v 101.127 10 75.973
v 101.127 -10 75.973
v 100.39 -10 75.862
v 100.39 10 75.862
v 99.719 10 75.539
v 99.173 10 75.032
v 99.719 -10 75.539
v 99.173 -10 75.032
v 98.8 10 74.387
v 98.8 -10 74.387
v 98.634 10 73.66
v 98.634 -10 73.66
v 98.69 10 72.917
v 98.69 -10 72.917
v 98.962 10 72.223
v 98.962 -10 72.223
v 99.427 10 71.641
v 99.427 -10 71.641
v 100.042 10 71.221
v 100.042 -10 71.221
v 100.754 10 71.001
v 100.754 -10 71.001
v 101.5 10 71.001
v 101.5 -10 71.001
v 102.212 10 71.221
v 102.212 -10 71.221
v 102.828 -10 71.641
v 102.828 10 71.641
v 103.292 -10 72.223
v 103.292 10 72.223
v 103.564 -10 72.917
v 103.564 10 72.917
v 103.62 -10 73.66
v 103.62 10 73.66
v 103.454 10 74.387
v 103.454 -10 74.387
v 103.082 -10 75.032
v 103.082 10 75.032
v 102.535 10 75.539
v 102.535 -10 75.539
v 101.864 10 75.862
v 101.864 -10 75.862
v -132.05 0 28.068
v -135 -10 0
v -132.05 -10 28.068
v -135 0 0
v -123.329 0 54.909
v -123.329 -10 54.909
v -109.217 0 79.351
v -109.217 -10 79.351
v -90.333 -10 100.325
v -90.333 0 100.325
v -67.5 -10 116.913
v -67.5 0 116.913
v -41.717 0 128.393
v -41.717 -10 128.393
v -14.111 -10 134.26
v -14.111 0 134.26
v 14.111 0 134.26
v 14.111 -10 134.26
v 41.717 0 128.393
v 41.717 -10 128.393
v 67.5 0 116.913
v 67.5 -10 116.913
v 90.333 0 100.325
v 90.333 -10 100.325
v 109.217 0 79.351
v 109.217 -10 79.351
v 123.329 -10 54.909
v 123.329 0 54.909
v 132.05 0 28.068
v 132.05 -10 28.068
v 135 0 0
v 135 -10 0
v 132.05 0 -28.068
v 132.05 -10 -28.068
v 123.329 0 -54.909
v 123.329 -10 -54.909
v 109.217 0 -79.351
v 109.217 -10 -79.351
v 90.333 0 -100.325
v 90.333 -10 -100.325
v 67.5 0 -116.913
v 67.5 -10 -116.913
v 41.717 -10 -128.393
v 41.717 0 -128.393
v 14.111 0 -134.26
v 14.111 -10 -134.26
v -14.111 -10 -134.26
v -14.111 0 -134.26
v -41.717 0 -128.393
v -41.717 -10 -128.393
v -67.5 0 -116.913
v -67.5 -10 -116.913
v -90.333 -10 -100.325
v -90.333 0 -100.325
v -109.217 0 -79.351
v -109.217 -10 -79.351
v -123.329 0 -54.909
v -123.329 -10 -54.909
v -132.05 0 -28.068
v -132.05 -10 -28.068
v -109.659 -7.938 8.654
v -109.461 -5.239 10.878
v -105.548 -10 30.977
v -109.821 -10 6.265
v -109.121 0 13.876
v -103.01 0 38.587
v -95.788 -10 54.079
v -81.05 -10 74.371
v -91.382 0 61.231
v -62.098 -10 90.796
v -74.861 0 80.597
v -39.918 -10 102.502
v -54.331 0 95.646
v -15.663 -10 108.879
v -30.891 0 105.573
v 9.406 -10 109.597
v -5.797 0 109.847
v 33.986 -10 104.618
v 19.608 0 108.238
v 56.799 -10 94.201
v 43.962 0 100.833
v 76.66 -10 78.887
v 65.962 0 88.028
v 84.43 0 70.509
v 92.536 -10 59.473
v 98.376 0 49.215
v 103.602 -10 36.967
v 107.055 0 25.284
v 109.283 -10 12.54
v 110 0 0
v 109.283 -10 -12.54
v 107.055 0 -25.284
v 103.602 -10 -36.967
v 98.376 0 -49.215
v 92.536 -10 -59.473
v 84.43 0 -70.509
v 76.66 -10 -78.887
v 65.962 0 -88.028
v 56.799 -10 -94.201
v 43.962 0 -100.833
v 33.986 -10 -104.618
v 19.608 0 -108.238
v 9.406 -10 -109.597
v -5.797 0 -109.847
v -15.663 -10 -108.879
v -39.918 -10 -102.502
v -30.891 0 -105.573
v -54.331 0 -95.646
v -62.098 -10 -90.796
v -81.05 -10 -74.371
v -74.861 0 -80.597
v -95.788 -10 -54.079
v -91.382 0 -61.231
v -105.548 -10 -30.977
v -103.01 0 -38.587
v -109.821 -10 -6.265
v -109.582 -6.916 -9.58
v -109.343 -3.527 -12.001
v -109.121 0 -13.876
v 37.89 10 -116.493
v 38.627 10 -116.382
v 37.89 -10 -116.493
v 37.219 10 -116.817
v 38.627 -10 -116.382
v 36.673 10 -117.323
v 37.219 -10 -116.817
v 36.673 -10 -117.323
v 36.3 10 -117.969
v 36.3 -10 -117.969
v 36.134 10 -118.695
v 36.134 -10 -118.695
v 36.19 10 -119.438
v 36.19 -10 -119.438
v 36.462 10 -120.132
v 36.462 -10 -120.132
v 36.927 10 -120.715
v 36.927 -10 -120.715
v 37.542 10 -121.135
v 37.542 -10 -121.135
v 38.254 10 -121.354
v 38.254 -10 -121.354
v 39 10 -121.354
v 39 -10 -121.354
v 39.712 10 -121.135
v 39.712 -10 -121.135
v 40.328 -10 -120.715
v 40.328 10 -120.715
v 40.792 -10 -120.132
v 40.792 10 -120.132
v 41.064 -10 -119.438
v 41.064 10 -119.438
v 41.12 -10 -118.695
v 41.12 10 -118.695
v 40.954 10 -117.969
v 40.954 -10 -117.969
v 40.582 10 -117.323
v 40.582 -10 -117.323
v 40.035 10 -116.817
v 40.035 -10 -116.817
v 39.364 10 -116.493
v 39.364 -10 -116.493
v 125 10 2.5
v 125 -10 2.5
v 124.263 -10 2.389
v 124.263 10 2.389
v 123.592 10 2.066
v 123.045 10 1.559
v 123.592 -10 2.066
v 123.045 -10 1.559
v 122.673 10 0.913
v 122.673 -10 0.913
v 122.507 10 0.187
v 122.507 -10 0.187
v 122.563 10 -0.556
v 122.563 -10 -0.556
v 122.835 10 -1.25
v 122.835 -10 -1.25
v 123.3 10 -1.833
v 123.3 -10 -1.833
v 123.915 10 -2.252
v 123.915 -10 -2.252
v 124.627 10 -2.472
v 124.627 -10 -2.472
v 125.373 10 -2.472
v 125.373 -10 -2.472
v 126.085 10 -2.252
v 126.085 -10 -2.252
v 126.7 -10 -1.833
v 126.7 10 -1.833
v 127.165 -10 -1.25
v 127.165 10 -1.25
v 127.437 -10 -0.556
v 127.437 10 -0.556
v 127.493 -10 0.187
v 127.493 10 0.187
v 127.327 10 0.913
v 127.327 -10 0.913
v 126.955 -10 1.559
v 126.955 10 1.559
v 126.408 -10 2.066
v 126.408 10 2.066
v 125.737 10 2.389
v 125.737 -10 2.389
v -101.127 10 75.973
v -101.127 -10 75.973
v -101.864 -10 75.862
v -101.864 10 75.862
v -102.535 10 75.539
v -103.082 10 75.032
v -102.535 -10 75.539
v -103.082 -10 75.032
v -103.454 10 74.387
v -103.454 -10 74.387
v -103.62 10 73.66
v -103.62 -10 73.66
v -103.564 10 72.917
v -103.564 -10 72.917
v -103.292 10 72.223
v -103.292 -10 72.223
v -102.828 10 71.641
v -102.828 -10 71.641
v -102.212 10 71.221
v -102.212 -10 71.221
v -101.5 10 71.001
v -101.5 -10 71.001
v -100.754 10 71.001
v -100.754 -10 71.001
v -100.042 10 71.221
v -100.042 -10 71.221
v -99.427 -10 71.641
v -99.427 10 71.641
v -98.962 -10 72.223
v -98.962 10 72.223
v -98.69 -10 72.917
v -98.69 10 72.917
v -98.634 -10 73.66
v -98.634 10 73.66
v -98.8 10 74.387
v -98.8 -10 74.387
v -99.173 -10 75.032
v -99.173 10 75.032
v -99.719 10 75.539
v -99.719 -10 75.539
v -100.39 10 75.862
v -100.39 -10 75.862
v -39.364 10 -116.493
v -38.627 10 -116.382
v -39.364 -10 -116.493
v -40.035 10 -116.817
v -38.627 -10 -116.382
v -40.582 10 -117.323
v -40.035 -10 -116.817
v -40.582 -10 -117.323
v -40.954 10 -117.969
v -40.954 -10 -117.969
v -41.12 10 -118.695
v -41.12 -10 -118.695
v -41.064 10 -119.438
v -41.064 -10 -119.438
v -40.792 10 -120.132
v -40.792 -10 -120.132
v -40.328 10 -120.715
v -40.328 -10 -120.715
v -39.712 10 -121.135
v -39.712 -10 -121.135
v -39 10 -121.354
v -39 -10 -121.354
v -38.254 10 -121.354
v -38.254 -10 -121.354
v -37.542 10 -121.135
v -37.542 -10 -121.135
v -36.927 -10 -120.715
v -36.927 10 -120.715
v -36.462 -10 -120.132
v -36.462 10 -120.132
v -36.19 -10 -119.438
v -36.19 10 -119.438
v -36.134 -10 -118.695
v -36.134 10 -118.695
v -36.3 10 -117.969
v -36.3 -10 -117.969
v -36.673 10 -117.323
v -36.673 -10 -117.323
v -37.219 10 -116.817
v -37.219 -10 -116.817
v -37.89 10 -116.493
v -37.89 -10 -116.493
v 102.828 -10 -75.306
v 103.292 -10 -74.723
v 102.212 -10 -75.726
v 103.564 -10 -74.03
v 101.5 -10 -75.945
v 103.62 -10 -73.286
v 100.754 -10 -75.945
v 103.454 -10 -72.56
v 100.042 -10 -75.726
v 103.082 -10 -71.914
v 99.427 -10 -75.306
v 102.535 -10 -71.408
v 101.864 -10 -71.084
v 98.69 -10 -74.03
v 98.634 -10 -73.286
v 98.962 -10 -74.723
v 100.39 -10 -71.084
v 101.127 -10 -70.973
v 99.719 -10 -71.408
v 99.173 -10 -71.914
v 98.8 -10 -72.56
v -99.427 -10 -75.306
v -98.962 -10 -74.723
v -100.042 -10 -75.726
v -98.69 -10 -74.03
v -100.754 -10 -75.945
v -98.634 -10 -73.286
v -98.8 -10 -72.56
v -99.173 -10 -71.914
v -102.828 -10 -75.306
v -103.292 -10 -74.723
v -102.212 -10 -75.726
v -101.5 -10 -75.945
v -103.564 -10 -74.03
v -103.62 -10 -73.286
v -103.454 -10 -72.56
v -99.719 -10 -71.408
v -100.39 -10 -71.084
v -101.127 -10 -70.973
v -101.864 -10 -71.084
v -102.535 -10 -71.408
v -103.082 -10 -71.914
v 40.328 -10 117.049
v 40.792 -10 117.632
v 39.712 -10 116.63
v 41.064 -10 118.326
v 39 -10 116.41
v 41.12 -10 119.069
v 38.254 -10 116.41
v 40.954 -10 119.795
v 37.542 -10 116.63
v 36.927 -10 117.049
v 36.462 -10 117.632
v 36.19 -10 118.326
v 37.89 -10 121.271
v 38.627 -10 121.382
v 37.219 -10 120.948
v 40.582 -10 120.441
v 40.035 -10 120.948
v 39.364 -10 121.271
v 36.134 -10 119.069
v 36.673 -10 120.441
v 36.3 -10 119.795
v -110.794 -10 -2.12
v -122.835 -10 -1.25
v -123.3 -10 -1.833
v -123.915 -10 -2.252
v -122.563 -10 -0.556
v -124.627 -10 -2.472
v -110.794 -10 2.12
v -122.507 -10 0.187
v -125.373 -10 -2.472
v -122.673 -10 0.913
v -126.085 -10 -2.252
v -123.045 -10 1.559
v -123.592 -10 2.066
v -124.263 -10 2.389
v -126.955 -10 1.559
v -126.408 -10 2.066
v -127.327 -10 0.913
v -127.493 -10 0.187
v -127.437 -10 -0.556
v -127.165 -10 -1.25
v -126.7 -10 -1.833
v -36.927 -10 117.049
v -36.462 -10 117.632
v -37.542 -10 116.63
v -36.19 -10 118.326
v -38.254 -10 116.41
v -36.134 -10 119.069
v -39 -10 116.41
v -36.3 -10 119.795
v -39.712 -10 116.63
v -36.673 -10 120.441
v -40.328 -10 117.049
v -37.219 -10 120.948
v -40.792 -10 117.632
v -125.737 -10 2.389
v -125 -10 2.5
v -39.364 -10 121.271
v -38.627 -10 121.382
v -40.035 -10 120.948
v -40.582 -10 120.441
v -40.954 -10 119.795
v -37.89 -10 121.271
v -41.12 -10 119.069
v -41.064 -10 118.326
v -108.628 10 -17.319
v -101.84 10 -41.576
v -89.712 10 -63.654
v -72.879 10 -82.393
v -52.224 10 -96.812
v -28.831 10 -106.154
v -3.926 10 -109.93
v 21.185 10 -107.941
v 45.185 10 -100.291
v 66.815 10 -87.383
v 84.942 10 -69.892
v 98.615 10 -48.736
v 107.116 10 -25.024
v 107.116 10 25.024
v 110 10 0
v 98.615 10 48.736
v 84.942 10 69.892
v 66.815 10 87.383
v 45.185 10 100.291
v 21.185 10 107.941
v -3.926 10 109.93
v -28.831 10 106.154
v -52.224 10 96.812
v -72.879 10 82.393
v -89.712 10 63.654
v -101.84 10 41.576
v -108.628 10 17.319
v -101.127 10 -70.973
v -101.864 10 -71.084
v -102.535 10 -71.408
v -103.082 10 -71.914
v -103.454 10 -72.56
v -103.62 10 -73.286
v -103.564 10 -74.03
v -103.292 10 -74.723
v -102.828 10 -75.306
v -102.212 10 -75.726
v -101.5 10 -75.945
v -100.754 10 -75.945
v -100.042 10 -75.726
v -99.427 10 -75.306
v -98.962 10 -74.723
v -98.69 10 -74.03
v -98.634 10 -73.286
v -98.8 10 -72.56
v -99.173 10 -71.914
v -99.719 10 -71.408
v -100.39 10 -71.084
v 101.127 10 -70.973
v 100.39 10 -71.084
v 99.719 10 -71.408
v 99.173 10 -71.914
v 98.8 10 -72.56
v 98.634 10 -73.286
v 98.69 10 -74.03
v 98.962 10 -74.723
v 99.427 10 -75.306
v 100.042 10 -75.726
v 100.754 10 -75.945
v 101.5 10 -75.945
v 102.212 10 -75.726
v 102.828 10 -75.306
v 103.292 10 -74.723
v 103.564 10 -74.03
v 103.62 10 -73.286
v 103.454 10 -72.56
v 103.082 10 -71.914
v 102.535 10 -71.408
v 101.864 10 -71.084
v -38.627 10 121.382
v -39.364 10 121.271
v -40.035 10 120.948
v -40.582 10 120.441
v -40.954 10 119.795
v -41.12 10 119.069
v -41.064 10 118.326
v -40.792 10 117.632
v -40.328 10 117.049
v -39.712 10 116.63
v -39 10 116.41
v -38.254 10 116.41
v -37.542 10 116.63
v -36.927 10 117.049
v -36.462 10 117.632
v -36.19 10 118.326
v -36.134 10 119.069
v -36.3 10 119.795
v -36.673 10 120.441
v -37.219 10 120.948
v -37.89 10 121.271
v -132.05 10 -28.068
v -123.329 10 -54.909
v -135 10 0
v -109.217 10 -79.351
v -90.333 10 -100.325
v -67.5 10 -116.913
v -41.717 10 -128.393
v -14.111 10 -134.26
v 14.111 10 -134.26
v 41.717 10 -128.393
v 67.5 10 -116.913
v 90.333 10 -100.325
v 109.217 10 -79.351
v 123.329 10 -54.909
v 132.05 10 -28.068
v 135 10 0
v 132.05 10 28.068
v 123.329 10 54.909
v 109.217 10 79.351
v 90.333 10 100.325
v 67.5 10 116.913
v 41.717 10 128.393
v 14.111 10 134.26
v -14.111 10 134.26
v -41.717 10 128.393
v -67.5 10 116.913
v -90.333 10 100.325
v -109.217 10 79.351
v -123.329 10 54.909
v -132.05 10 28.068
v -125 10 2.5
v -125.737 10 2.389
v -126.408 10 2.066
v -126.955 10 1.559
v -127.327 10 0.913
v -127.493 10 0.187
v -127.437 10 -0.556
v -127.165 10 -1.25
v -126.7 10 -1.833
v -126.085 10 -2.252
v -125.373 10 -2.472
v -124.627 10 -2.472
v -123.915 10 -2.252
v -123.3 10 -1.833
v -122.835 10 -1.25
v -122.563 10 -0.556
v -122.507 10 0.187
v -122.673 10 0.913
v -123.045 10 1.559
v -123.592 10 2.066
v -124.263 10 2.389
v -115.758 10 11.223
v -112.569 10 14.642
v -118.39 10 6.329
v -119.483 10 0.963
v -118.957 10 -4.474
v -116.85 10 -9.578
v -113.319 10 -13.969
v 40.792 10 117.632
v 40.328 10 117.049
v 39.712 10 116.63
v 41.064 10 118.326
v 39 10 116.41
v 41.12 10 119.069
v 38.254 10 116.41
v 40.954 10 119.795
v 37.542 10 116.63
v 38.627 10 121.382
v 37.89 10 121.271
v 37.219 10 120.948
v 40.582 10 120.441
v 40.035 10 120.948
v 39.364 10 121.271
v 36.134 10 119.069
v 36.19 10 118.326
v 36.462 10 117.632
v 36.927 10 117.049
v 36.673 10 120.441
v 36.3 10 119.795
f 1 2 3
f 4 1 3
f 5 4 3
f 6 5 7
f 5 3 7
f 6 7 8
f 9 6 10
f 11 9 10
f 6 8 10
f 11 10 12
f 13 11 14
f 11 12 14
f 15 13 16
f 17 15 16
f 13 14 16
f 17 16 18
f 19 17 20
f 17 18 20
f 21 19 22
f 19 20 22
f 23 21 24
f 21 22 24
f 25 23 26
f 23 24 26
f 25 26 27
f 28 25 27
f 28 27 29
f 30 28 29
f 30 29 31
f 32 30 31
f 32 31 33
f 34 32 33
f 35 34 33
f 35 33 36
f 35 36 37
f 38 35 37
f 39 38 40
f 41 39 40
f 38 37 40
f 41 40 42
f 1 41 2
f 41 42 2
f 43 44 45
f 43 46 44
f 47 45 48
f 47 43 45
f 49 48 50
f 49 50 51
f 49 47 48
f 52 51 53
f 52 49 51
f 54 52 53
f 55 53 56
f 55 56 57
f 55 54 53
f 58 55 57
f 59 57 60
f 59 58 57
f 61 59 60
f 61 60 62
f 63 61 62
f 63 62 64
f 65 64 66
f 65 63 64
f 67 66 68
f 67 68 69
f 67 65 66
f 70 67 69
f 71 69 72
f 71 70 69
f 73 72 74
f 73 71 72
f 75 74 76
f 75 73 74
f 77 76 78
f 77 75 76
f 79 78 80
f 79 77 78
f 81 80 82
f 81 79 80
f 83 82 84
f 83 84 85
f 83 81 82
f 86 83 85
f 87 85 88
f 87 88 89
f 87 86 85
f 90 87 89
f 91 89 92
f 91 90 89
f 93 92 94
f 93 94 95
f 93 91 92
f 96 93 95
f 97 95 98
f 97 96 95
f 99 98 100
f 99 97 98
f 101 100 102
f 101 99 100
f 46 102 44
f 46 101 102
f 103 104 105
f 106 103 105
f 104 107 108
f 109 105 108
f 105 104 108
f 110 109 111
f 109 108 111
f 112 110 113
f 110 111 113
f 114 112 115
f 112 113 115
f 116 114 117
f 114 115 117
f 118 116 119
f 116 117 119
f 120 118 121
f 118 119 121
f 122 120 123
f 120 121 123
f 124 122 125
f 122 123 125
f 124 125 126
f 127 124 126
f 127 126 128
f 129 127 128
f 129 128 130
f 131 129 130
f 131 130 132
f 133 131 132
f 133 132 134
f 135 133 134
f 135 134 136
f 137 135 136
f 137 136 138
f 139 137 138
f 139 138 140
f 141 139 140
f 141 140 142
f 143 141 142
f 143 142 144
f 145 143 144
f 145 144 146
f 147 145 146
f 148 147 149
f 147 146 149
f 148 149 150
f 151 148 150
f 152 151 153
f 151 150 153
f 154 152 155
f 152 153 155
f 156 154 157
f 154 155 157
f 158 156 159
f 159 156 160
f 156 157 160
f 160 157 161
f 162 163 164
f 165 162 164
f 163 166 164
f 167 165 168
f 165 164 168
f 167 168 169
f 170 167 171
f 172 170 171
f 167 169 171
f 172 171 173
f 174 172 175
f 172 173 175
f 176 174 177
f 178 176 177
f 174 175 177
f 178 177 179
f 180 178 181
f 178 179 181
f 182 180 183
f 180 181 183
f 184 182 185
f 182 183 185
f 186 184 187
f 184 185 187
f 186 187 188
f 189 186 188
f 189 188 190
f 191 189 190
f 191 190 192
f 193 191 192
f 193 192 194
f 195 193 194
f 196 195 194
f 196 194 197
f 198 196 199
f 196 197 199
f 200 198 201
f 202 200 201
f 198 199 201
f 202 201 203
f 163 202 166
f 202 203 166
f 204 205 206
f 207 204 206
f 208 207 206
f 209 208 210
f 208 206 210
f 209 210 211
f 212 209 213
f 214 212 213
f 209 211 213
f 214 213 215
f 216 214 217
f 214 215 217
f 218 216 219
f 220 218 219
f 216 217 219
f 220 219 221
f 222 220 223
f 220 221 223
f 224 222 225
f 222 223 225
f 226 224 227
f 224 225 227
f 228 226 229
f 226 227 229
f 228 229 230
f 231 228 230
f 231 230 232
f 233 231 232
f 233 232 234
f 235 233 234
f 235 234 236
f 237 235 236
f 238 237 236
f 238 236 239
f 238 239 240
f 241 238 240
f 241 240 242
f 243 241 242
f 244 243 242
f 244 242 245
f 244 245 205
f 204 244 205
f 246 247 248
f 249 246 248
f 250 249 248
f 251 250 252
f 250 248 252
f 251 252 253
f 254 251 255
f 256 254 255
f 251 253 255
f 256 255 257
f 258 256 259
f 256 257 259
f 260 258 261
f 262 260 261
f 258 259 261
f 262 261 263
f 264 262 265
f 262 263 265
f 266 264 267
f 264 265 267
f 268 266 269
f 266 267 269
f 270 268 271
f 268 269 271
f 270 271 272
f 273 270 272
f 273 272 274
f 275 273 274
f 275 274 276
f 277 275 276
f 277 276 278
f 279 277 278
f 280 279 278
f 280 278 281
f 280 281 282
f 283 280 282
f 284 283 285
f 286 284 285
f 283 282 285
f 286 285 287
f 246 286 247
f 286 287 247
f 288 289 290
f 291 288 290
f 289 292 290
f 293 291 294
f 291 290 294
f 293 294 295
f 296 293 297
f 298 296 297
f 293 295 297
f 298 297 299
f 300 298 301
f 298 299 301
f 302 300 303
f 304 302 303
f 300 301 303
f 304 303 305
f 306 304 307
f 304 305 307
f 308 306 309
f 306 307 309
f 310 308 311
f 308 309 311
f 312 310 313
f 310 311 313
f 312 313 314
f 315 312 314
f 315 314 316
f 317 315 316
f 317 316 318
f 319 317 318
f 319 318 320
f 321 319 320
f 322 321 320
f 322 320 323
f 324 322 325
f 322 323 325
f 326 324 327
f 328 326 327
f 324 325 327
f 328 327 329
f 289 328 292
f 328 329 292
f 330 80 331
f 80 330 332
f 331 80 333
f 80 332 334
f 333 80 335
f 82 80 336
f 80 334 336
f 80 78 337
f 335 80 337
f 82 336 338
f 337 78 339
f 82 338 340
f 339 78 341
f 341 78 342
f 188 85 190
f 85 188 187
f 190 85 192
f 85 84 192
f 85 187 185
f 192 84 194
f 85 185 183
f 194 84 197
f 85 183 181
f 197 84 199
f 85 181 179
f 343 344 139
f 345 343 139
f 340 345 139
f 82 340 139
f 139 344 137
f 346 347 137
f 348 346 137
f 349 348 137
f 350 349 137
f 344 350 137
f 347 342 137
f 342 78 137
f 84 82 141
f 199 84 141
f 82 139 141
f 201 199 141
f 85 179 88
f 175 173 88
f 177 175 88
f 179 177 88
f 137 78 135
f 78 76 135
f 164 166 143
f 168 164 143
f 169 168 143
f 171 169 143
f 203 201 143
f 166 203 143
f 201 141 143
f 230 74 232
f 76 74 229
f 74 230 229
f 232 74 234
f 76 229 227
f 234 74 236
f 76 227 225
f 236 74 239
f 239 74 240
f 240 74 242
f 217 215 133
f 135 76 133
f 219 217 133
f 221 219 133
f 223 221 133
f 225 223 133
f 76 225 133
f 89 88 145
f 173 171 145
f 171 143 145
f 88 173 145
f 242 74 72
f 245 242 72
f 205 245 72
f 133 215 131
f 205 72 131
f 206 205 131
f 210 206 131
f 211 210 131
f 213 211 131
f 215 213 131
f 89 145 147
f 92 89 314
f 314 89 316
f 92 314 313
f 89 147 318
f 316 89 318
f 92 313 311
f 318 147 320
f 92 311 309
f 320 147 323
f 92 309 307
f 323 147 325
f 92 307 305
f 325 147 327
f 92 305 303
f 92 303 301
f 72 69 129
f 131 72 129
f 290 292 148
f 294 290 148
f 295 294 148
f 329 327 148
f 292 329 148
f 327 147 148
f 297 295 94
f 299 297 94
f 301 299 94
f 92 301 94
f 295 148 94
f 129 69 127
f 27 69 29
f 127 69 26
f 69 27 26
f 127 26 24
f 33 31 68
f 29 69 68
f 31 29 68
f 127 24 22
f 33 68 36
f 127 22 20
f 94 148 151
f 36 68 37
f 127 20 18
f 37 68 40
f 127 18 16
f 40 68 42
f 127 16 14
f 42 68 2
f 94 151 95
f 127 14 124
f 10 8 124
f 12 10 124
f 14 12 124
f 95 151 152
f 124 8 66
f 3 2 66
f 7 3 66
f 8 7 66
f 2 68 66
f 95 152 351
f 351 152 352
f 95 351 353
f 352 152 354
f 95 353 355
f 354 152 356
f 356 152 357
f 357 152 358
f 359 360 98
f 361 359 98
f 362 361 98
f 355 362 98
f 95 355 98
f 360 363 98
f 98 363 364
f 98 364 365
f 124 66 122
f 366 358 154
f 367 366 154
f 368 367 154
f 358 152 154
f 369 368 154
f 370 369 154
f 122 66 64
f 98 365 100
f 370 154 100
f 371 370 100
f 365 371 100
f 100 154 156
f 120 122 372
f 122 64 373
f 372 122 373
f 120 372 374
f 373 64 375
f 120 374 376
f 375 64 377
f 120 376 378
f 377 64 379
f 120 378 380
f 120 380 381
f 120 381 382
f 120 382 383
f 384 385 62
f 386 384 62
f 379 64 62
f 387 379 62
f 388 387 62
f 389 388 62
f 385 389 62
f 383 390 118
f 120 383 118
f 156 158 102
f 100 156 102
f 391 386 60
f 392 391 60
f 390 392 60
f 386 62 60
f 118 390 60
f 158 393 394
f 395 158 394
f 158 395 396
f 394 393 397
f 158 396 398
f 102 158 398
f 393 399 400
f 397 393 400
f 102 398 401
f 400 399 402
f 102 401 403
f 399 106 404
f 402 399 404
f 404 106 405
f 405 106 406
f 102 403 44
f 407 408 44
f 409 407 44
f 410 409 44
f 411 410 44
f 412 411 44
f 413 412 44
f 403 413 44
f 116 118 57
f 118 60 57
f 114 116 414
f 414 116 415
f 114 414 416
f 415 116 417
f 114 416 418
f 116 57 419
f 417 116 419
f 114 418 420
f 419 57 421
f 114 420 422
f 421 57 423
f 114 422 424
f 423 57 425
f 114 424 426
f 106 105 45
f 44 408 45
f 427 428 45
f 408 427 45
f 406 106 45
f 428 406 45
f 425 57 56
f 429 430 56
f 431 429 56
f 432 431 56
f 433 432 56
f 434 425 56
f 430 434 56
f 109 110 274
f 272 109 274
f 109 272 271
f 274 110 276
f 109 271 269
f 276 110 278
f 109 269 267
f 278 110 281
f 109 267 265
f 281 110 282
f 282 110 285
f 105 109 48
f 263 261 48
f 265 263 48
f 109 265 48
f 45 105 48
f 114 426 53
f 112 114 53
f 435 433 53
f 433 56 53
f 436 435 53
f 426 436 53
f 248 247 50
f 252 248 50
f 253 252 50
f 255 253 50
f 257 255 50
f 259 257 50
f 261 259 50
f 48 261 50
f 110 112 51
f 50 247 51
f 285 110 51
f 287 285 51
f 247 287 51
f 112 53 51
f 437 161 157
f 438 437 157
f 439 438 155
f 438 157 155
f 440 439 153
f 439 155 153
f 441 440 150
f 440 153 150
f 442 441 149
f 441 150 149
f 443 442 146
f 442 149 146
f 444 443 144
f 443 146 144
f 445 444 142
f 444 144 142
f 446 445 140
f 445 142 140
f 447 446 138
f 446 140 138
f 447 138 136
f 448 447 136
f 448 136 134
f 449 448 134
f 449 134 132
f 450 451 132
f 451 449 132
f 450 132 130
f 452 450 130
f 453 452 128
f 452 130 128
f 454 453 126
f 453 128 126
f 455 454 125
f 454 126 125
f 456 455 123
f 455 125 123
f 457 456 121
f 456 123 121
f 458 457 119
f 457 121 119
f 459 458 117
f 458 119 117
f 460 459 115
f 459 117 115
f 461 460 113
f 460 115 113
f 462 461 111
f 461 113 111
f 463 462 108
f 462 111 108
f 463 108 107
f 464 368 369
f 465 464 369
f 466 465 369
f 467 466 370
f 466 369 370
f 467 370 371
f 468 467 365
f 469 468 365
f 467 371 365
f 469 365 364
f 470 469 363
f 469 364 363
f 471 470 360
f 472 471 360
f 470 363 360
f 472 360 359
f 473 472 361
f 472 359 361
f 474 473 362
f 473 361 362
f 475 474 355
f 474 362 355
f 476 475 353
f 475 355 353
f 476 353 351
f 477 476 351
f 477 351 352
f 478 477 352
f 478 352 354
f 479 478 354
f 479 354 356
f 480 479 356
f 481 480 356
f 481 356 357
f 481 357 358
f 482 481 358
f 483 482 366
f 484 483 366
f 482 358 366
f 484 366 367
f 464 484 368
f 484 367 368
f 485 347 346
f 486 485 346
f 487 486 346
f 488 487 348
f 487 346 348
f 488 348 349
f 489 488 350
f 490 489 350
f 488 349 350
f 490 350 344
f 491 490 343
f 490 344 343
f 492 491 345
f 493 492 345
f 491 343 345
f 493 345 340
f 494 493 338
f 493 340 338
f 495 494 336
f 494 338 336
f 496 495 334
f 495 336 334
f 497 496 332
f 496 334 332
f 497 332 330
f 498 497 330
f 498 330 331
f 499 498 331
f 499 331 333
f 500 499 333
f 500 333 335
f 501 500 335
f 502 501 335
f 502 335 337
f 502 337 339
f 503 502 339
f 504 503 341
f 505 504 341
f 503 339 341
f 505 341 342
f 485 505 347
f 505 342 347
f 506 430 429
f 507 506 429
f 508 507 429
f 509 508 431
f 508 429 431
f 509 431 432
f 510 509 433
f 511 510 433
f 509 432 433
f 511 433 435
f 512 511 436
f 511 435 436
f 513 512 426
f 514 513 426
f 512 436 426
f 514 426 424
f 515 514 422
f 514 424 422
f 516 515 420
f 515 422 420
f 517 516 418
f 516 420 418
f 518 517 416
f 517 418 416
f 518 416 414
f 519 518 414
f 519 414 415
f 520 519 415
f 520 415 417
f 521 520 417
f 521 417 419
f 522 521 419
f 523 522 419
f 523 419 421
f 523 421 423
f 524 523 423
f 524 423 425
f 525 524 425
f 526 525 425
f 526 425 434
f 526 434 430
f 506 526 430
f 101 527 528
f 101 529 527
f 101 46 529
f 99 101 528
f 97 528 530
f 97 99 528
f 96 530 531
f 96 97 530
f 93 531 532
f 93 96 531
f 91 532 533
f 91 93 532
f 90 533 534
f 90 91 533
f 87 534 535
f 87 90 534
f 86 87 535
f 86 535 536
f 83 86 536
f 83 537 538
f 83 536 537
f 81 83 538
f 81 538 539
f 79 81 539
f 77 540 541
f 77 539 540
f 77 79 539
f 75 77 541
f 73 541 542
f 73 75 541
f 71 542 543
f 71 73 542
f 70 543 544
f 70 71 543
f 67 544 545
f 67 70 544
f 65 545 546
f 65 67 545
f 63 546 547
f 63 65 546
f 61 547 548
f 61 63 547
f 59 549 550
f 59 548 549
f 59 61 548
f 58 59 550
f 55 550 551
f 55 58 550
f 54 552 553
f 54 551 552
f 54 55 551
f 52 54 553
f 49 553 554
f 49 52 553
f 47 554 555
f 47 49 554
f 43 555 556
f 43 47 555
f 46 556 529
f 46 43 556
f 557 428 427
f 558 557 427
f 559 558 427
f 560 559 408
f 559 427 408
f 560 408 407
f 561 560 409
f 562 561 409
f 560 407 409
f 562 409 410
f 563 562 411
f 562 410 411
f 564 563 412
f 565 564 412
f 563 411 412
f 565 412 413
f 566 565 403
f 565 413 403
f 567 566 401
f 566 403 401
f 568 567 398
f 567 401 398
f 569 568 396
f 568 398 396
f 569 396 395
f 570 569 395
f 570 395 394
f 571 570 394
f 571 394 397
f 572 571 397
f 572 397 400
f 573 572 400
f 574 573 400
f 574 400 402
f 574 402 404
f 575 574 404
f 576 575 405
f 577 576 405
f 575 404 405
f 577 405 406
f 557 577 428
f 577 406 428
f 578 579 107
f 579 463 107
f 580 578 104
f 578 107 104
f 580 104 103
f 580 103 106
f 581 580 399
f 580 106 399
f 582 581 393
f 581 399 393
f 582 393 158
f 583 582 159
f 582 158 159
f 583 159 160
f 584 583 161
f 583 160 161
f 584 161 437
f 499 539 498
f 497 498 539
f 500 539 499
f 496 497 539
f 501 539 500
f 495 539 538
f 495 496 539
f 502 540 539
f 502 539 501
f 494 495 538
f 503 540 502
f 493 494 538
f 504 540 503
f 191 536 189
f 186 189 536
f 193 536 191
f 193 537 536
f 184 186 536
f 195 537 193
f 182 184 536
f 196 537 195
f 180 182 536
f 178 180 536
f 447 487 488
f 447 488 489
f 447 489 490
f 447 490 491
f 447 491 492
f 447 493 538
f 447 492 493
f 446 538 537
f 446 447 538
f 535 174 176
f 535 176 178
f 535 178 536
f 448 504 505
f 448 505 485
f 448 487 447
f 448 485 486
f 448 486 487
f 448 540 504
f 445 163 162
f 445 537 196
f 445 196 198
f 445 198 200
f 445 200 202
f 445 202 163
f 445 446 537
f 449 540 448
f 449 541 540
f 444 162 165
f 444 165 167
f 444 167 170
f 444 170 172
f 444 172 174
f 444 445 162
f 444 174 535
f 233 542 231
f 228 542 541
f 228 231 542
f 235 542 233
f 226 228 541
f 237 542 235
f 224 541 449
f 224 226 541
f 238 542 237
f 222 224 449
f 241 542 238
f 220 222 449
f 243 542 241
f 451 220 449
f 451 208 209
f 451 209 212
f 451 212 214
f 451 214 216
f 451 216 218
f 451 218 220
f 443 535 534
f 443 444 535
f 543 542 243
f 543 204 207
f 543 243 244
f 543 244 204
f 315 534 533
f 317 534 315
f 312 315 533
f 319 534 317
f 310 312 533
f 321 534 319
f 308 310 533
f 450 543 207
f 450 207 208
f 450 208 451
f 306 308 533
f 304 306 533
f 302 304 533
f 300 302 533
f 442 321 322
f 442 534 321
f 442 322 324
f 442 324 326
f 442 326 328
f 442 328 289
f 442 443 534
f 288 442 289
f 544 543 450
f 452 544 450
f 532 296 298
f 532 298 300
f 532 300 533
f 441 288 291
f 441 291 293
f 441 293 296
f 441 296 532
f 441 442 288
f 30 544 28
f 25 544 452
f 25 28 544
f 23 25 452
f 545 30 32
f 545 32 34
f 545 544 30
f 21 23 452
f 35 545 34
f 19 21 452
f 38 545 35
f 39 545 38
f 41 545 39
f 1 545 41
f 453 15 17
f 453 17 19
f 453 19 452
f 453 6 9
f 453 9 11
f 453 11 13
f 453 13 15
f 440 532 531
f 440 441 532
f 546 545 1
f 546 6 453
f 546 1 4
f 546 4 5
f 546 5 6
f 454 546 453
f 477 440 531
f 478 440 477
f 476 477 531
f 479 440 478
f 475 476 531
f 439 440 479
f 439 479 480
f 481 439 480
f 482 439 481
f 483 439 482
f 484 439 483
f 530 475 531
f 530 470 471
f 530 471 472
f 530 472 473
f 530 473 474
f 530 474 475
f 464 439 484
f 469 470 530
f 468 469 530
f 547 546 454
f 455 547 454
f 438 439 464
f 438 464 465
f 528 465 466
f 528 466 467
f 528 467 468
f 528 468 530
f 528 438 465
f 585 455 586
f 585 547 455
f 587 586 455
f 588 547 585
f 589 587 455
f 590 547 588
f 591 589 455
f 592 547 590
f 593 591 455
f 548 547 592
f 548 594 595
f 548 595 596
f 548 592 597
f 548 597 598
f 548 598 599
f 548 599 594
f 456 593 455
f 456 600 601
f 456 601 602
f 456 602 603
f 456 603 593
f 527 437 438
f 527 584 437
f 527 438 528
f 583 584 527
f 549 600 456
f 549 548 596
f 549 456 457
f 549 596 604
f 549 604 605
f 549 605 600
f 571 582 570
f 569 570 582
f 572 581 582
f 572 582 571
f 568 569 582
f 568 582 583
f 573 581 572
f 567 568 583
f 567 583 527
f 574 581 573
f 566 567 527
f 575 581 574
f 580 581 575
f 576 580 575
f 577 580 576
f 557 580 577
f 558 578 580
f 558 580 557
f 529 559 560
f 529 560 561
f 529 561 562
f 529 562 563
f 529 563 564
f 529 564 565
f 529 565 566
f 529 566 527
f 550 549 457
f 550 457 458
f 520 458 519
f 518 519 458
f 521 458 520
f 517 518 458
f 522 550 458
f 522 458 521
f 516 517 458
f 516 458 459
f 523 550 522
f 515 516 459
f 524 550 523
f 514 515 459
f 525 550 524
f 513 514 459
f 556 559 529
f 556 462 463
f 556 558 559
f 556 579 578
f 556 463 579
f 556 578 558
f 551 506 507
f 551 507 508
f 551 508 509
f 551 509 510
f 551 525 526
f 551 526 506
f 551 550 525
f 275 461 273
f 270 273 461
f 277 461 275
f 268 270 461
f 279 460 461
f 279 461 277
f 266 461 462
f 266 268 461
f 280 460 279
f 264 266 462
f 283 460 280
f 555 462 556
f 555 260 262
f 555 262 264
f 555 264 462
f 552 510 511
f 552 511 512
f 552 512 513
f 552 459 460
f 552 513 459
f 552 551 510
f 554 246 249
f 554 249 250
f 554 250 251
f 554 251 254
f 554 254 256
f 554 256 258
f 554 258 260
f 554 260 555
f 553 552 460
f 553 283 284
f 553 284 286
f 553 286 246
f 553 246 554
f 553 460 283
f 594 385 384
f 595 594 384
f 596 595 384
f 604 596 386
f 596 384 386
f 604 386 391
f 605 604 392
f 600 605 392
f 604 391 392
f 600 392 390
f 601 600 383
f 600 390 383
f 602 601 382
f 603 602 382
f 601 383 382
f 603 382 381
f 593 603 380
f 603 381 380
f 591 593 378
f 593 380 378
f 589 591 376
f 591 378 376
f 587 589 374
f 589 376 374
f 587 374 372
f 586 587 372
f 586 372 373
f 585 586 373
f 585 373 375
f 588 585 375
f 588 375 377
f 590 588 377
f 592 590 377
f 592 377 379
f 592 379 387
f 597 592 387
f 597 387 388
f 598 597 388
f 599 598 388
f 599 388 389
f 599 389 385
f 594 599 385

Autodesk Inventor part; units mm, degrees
ref_plane "YZ Plane" through (0, 0, 0) normal (1, 0, 0) x (0, 1, 0)
sketch "Sketch1" plane through (0, 0, 0) normal (0, 1, 0) x (-1, 0, 0)
  circle A0 centre (0, 0) radius 135
  circle A1 centre (0, 0) radius 110
  dimension "d0" = 270
  dimension "d1" = 220
extrude "Extrusion1" add sketch "Sketch1" along normal mid plane 20
sketch "Sketch3" plane through (0, 10, 0) normal (0, 1, 0) x (1, 0, 0)
  circle A0 centre (0, 0) radius 125
  circle A1 centre (125, 0) radius 2.5
  circle A2 centre (101.1271, 73.4732) radius 2.5
  circle A3 centre (38.6271, 118.8821) radius 2.5
  circle A4 centre (-38.6271, 118.8821) radius 2.5
  circle A5 centre (-101.1271, 73.4732) radius 2.5
  circle A6 centre (-125, 0) radius 2.5
  circle A7 centre (-101.1271, -73.4732) radius 2.5
  circle A8 centre (-38.6271, -118.8821) radius 2.5
  circle A9 centre (38.6271, -118.8821) radius 2.5
  circle A10 centre (101.1271, -73.4732) radius 2.5
  dimension "d7" = 250
  dimension "d8" = 5
  dimension "d11" = 360
hole "Hole1" at (125, 10, 0) at (101.1271, 10, 73.4732) at (38.6271, 10, 118.8821) at (-38.6271, 10, 118.8821) at (-101.1271, 10, 73.4732) at (-125, 10, 0) at (-101.1271, 10, -73.4732) at (-38.6271, 10, -118.8821) at (38.6271, 10, -118.8821) at (101.1271, 10, -73.4732) direction (0, -1, 0) diameter 5 end through all
ref_plane "Work Plane6" through (-134.9375, 20, -12.7) normal (0.3947, -0.9188, 0) x (0, 0, 1)
ref_plane "Work Plane7" through (-109.8713, -38.3432, -12.7) normal (0.3947, -0.9188, 0) x (0, 0, 1)
sketch "Sketch5" plane through (-109.8713, -38.3432, -12.7) normal (0.3947, -0.9188, 0) x (0, 0, 1)
  circle A0 centre (12.7, -30.2265) radius 20
  point P0 (12.7, -116.0845)
  dimension "d26" = 40
  dimension "d27" = 85.858
extrude "Extrusion4" cut sketch "Sketch5" against normal blind 251.3
properties part number "Cylinder Spacer (x3)"
